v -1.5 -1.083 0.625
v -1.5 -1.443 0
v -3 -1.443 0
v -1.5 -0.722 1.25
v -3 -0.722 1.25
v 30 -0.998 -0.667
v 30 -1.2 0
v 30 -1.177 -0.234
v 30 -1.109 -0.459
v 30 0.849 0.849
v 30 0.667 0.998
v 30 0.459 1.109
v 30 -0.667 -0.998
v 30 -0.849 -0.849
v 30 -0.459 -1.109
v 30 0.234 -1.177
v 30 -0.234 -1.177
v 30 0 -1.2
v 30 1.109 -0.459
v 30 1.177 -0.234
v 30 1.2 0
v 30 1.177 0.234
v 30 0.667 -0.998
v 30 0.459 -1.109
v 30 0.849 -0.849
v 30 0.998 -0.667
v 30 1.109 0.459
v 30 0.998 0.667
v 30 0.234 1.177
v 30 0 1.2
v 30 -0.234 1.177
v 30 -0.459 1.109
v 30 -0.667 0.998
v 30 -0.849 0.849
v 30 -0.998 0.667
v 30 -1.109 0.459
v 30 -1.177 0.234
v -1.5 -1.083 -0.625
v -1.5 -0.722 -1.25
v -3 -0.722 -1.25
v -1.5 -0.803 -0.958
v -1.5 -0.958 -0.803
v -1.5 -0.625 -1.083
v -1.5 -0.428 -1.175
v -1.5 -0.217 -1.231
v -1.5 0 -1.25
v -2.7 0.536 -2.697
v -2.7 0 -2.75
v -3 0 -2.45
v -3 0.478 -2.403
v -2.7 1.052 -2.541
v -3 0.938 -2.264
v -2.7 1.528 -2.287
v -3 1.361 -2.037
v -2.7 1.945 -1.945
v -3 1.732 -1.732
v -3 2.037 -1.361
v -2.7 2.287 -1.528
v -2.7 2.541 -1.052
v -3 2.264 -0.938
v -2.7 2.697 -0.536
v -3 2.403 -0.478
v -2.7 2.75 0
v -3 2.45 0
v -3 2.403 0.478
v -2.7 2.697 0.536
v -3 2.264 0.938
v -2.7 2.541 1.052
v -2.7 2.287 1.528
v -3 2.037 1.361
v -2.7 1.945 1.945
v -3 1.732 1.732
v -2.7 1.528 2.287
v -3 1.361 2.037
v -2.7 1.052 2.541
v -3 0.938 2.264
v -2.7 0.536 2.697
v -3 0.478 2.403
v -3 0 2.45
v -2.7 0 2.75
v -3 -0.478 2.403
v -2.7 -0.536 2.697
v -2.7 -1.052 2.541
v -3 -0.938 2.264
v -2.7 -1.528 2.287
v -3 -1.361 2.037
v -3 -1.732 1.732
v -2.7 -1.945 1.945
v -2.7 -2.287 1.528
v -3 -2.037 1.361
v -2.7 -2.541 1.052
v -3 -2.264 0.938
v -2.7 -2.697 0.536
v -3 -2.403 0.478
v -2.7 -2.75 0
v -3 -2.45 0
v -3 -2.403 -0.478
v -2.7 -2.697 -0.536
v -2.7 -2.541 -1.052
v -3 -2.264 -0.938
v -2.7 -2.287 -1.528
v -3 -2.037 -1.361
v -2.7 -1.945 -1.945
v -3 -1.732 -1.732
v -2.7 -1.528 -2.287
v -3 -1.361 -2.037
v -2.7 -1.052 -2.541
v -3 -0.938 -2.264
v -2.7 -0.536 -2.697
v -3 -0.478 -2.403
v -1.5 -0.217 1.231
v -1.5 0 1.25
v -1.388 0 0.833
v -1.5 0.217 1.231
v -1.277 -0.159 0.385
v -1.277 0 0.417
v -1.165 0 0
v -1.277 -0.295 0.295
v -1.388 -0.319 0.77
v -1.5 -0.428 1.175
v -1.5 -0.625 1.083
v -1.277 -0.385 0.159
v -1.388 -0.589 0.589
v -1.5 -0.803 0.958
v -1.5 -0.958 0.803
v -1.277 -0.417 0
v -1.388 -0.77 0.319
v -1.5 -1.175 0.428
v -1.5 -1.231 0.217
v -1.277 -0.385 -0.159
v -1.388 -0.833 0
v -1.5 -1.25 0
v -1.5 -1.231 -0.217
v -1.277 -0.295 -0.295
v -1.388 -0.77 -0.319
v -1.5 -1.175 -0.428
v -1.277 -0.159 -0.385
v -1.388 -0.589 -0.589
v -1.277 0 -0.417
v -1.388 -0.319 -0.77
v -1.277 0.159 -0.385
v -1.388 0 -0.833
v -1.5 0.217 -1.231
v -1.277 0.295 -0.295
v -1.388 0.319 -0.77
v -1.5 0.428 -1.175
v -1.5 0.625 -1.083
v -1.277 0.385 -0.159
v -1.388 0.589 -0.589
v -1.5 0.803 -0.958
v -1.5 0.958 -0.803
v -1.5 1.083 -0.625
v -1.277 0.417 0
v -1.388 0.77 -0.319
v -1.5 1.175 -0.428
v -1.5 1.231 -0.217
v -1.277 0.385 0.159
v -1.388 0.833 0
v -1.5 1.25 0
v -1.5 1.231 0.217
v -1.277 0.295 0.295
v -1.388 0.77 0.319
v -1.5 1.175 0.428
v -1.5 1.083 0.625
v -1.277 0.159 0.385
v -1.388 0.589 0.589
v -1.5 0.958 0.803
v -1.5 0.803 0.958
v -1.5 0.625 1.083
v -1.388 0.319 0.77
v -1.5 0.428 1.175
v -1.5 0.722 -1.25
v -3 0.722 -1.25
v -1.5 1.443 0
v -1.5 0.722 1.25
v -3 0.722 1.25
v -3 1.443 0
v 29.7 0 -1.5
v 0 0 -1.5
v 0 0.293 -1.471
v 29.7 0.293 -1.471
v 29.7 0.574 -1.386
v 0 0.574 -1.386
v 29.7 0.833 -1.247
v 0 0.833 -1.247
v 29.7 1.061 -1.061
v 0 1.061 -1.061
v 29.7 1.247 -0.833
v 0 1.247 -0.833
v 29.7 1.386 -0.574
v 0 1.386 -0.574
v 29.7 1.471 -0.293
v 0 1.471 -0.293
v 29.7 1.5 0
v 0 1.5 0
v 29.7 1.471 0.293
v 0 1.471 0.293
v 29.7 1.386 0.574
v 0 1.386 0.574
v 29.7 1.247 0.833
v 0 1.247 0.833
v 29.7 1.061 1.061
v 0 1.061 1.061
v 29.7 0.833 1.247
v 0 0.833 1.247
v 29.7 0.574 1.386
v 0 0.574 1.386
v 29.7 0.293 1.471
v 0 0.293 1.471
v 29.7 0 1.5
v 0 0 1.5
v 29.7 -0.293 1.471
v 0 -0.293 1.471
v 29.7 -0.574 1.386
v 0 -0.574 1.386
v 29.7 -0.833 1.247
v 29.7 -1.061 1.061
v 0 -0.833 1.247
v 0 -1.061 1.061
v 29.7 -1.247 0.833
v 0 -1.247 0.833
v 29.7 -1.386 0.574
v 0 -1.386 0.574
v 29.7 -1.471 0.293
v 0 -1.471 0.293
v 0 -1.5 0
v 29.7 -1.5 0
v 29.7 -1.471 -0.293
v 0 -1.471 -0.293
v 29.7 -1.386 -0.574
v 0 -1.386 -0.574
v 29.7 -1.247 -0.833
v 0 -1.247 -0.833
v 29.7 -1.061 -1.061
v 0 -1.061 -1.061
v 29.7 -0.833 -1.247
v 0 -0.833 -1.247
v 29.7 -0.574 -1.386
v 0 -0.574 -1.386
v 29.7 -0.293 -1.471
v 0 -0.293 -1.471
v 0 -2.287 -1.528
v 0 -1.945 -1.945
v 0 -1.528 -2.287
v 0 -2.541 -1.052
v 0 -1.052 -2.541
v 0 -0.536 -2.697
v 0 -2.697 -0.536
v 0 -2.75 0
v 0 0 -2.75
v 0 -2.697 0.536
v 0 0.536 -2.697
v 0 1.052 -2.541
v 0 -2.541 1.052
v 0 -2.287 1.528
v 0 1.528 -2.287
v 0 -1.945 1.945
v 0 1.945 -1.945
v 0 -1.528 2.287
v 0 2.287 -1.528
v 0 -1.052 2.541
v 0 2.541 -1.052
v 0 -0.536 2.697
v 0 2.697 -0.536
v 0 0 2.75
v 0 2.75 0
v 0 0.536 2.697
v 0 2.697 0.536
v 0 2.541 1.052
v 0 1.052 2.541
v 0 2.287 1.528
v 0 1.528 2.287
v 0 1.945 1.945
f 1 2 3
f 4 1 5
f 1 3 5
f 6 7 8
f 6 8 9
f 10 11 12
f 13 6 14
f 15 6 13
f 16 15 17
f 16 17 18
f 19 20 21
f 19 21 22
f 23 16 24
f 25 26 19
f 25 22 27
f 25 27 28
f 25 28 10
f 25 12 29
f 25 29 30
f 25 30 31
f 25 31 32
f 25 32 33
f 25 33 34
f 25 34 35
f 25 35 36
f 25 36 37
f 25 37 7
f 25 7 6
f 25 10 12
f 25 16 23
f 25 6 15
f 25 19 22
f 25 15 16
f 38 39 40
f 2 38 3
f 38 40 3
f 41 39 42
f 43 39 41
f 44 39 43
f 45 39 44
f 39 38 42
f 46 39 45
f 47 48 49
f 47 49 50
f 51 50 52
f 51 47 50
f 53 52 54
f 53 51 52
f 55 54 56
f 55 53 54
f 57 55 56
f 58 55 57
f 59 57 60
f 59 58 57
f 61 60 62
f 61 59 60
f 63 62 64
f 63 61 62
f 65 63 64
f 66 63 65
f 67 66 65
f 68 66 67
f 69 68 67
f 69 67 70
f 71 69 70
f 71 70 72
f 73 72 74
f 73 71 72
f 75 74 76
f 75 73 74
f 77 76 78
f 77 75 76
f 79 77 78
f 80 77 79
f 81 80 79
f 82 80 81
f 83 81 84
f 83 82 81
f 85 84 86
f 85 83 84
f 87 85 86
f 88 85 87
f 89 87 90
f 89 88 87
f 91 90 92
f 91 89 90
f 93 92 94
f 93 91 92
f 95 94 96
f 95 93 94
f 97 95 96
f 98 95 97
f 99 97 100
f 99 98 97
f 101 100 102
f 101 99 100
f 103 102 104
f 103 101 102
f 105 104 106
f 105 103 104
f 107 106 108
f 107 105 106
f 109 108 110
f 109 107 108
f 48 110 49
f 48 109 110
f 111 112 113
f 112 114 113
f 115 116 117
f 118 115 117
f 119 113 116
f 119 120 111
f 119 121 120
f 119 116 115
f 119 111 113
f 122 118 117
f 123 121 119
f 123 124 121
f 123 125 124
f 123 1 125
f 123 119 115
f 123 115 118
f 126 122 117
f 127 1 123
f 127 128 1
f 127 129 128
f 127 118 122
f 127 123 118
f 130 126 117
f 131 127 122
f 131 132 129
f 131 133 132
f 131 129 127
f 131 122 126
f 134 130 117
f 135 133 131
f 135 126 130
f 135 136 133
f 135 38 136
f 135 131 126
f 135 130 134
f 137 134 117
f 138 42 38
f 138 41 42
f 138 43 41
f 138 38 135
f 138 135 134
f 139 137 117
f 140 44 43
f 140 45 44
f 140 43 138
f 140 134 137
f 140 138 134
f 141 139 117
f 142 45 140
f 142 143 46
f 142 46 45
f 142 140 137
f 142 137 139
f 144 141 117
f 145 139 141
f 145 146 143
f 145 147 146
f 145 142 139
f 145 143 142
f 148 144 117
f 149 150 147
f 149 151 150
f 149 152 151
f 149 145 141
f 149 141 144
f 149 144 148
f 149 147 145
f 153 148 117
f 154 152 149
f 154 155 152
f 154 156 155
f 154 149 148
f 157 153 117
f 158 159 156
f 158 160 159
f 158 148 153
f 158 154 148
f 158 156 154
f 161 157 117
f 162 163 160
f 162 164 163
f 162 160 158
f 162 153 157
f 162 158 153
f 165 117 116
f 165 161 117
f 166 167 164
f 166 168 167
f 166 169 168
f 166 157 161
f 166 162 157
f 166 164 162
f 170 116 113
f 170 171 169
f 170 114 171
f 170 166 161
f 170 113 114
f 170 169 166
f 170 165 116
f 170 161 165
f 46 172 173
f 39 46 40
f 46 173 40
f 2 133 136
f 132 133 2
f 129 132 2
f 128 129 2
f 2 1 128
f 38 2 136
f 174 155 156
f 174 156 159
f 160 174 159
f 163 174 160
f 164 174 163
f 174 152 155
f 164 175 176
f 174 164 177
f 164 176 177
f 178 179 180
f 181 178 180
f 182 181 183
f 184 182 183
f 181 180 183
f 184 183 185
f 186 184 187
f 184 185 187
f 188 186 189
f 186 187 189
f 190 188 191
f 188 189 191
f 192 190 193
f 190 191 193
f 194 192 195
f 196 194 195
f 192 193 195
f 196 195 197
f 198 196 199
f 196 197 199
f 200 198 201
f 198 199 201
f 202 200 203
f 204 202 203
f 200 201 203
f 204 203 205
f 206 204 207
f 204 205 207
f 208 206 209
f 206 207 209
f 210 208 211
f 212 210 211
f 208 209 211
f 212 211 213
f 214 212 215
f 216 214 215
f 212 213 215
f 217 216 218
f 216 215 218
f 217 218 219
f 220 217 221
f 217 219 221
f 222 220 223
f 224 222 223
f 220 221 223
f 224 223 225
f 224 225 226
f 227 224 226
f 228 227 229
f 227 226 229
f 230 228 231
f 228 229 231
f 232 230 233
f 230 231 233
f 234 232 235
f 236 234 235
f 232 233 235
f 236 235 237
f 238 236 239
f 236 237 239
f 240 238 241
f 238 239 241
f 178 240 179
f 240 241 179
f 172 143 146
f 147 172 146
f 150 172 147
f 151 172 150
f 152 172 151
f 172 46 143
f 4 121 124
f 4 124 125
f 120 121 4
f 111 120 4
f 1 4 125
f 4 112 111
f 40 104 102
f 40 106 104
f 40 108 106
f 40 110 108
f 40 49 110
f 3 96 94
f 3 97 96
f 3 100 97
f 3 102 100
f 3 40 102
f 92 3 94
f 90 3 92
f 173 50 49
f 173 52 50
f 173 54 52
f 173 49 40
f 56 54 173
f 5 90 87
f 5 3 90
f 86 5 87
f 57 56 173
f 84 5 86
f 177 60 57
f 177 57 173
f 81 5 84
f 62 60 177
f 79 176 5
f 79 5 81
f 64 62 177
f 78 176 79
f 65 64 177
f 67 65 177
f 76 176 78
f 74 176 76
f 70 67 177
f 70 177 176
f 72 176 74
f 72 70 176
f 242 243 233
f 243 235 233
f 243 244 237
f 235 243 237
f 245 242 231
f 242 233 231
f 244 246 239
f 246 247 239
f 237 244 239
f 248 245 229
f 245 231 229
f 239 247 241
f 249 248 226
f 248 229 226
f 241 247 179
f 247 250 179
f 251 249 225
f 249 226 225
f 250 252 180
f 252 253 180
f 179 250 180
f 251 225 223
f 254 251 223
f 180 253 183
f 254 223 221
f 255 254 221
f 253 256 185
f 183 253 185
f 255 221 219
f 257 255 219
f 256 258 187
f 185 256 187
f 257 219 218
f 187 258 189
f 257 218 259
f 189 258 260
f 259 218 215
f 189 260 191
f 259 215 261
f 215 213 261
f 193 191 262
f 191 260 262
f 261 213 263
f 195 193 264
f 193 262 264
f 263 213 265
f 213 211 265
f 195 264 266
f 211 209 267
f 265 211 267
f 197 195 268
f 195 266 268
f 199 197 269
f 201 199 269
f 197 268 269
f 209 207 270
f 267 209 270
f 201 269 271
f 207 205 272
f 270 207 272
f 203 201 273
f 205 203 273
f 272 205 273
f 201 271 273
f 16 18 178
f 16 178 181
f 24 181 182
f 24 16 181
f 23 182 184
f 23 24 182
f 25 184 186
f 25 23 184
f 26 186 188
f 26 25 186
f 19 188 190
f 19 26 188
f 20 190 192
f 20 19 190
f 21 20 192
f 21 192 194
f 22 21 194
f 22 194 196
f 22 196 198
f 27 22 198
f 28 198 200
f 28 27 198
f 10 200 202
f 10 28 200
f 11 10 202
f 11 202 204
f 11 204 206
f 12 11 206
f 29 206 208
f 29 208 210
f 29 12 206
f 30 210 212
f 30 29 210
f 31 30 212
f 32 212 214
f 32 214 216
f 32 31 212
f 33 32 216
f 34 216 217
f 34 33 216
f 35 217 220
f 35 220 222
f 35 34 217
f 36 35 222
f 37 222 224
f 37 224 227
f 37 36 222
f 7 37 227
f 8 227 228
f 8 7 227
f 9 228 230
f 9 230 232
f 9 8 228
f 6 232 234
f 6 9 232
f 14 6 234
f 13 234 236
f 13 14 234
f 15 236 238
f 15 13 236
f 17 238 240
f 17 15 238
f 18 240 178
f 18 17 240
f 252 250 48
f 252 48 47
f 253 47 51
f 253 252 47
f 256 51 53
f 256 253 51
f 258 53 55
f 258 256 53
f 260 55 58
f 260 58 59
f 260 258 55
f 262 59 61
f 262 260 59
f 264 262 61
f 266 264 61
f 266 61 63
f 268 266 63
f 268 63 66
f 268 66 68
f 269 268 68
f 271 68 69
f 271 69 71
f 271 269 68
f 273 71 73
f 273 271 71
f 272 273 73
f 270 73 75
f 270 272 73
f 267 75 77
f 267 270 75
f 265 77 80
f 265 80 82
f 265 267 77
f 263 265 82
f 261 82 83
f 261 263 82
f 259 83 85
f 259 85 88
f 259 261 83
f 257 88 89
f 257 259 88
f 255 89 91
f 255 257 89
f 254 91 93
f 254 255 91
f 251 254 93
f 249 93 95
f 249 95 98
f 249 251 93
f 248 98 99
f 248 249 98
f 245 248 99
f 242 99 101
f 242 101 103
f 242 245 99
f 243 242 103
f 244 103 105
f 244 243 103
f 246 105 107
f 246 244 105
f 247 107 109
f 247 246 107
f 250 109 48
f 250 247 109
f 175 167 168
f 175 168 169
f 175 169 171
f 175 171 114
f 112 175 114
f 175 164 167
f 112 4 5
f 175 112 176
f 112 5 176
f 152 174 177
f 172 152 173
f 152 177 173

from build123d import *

# Parameters (mm, degrees)
SKETCH1_W           = 3
SKETCH1_H           = 2.75
SKETCH2_R           = 1.5
BOSS_EXTRUDE1_DEPTH = 30
CUT_EXTRUDE1_DEPTH  = 1.5
CHAMFER1_SIZE       = 0.3


with BuildPart() as part:
    # Sketch1 → Revolve1 (revolve)
    with BuildSketch(Plane.XY, mode=Mode.PRIVATE) as revolve1_sk:
        with Locations((-1.5, 1.375)):
            Rectangle(SKETCH1_W, SKETCH1_H)
    revolve(revolve1_sk.sketch.rotate(Axis((-3, 0, 0), (1, 0, 0)), 270), axis=Axis((-3, 0, 0), (1, 0, 0)))

    # Sketch2 → Boss-Extrude1 (add)
    with BuildSketch(Plane(origin=(0, 0, 0), x_dir=(0, 0, -1), z_dir=(1, 0, 0))):
        Circle(SKETCH2_R)
    extrude(amount=BOSS_EXTRUDE1_DEPTH)

    # Sketch3 → Cut-Extrude1 (cut)
    with BuildSketch(Plane.ZY.offset(3)):
        Polygon((1.25, -0.721687836), (1.25, 0.721687836), (0, 1.443375673), (-1.25, 0.721687836), (-1.25, -0.721687836), (0, -1.443375673), align=None)
    extrude(amount=-CUT_EXTRUDE1_DEPTH, mode=Mode.SUBTRACT)

    # Sketch4 → Cut-Revolve1 (revolve, cut)
    with BuildSketch(Plane.XY, mode=Mode.PRIVATE) as cut_revolve1_sk:
        Polygon((-1.5, 1.25), (-1.5, 0), (-1.165063509, 0), align=None)
    revolve(cut_revolve1_sk.sketch.rotate(Axis((-1.500025, 0, 0), (1, 0, 0)), 90), axis=Axis((-1.500025, 0, 0), (1, 0, 0)), mode=Mode.SUBTRACT)

    # Chamfer1
    chamfer1_edges = [part.edges().sort_by_distance(p)[0] for p in [
        (-3, 0, 2.75),
        (30, 0, 1.5),
    ]]
    chamfer(chamfer1_edges, length=CHAMFER1_SIZE)


solid = part.part
